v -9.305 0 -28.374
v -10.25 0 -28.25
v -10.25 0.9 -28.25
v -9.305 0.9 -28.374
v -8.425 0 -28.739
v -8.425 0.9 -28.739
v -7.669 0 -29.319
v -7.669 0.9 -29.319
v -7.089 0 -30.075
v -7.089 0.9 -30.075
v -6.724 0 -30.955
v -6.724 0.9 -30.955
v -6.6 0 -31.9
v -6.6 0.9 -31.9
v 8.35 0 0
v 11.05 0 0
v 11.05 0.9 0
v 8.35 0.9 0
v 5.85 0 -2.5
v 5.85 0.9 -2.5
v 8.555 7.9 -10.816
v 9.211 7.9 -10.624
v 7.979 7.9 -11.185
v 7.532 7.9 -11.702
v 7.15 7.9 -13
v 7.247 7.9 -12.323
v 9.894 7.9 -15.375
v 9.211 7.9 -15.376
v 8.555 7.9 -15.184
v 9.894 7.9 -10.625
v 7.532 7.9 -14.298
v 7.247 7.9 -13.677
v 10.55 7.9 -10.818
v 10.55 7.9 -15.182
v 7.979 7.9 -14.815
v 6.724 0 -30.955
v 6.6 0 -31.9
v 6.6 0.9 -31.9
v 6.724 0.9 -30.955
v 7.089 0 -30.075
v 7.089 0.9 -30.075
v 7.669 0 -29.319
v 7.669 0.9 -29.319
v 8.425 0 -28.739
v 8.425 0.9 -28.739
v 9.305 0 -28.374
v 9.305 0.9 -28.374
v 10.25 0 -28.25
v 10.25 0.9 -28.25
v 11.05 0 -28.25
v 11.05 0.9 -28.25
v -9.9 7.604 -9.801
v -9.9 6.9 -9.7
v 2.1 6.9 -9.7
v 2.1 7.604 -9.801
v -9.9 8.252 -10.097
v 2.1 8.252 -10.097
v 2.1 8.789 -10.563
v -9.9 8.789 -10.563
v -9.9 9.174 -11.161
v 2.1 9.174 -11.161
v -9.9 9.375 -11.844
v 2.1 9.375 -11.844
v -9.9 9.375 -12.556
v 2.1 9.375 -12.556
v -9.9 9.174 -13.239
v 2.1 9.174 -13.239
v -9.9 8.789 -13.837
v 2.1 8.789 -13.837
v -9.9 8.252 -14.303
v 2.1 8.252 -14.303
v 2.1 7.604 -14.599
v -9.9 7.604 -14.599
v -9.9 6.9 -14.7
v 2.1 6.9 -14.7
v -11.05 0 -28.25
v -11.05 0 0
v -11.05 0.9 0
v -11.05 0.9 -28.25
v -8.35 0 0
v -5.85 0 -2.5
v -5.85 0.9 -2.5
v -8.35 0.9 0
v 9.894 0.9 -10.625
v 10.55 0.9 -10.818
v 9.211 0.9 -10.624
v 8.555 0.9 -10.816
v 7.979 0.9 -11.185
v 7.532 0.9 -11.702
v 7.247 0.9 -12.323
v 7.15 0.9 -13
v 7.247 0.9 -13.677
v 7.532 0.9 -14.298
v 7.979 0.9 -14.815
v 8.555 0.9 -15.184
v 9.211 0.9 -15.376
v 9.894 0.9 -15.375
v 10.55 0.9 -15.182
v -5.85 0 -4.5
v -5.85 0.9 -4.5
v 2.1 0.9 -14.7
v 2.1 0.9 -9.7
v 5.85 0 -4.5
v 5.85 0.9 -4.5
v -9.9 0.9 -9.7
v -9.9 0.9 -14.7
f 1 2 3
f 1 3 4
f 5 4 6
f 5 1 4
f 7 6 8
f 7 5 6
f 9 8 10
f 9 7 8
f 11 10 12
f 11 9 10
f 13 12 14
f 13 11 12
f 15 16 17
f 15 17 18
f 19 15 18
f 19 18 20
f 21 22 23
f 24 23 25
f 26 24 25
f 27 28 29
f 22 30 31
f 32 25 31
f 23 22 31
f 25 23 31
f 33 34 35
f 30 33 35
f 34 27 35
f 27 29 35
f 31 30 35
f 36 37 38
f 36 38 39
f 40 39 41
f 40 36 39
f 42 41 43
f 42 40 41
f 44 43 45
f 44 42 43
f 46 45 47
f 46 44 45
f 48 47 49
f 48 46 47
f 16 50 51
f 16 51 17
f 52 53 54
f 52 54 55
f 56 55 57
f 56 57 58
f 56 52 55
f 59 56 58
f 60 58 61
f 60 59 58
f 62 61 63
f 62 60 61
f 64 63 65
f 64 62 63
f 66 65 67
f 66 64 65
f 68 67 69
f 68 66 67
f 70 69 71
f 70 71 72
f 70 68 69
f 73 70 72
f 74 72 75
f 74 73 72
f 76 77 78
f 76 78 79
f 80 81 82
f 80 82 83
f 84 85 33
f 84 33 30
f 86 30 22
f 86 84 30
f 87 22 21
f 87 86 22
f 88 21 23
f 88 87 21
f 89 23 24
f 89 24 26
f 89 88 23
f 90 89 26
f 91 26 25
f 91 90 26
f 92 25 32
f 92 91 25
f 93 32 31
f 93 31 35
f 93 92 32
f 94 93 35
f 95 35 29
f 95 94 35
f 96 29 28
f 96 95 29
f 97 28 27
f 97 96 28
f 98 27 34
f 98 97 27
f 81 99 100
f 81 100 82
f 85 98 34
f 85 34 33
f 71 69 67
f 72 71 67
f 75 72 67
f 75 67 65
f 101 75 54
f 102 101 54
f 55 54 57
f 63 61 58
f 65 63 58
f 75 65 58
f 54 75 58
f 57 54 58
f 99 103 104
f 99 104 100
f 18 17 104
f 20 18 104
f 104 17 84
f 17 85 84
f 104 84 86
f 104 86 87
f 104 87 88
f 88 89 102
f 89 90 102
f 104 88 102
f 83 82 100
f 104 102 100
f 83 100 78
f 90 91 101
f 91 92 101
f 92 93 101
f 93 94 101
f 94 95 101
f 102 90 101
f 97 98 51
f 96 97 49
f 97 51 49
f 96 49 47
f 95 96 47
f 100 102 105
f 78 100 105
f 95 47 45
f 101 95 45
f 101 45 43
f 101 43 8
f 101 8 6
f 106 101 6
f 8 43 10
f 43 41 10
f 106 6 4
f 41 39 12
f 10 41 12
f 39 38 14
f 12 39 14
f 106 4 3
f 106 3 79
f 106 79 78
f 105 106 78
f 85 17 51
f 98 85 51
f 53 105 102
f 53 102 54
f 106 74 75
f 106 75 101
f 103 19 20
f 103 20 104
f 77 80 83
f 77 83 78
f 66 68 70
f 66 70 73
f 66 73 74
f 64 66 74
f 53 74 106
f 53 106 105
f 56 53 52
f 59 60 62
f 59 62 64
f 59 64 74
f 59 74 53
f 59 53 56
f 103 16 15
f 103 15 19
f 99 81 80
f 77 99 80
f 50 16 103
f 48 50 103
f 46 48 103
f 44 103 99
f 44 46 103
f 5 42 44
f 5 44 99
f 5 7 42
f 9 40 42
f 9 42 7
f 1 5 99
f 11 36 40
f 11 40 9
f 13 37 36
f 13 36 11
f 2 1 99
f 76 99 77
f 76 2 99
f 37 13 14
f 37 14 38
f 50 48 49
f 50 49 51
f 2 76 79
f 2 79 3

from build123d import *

# Parameters (mm, degrees)
BOSS_EXTRUDE1_DEPTH = 0.9
BOSS_EXTRUDE4_DEPTH = 12
BOSS_EXTRUDE5_DEPTH = 7


with BuildPart() as part:
    # Sketch1 → Boss-Extrude1 (new body)
    with BuildSketch(Plane(origin=(0, 0, 0), x_dir=(1, 0, 0), z_dir=(0, 1, 0))):
        with BuildLine():
            Line((-11.05, 0), (-11.05, 28.25))
            Line((-11.05, 28.25), (-10.25, 28.25))
            ThreePointArc((-10.25, 28.25), (-7.669060249, 29.319060249), (-6.6, 31.9))
            Line((-6.6, 31.9), (6.6, 31.9))
            ThreePointArc((6.6, 31.9), (7.669060249, 29.319060249), (10.25, 28.25))
            Line((10.25, 28.25), (11.05, 28.25))
            Line((11.05, 28.25), (11.05, 0))
            Line((11.05, 0), (8.35, 0))
            Line((8.35, 0), (5.85, 2.5))
            Line((5.85, 2.5), (5.85, 4.5))
            Line((5.85, 4.5), (-5.85, 4.5))
            Line((-5.85, 4.5), (-5.85, 2.5))
            Line((-5.85, 2.5), (-8.35, 0))
            Line((-8.35, 0), (-11.05, 0))
        make_face()
    extrude(amount=BOSS_EXTRUDE1_DEPTH)

    # Sketch4 → Boss-Extrude4 (add)
    with BuildSketch(Plane.ZY.offset(9.9)):
        with BuildLine():
            Line((-9.7, 0.9), (-9.7, 6.9))
            ThreePointArc((-9.7, 6.9), (-12.2, 9.4), (-14.7, 6.9))
            Line((-14.7, 6.9), (-14.7, 0.9))
            Line((-14.7, 0.9), (-9.7, 0.9))
        make_face()
    extrude(amount=-BOSS_EXTRUDE4_DEPTH)

    # Sketch5 → Boss-Extrude5 (add)
    with BuildSketch(Plane(origin=(0, 0.9, 0), x_dir=(1, 0, 0), z_dir=(0, 1, 0))):
        with BuildLine():
            Line((10.55, 15.181742423), (10.55, 10.818257577))
            ThreePointArc((10.55, 10.818257577), (7.15, 13), (10.55, 15.181742423))
        make_face()
    extrude(amount=BOSS_EXTRUDE5_DEPTH)


solid = part.part
